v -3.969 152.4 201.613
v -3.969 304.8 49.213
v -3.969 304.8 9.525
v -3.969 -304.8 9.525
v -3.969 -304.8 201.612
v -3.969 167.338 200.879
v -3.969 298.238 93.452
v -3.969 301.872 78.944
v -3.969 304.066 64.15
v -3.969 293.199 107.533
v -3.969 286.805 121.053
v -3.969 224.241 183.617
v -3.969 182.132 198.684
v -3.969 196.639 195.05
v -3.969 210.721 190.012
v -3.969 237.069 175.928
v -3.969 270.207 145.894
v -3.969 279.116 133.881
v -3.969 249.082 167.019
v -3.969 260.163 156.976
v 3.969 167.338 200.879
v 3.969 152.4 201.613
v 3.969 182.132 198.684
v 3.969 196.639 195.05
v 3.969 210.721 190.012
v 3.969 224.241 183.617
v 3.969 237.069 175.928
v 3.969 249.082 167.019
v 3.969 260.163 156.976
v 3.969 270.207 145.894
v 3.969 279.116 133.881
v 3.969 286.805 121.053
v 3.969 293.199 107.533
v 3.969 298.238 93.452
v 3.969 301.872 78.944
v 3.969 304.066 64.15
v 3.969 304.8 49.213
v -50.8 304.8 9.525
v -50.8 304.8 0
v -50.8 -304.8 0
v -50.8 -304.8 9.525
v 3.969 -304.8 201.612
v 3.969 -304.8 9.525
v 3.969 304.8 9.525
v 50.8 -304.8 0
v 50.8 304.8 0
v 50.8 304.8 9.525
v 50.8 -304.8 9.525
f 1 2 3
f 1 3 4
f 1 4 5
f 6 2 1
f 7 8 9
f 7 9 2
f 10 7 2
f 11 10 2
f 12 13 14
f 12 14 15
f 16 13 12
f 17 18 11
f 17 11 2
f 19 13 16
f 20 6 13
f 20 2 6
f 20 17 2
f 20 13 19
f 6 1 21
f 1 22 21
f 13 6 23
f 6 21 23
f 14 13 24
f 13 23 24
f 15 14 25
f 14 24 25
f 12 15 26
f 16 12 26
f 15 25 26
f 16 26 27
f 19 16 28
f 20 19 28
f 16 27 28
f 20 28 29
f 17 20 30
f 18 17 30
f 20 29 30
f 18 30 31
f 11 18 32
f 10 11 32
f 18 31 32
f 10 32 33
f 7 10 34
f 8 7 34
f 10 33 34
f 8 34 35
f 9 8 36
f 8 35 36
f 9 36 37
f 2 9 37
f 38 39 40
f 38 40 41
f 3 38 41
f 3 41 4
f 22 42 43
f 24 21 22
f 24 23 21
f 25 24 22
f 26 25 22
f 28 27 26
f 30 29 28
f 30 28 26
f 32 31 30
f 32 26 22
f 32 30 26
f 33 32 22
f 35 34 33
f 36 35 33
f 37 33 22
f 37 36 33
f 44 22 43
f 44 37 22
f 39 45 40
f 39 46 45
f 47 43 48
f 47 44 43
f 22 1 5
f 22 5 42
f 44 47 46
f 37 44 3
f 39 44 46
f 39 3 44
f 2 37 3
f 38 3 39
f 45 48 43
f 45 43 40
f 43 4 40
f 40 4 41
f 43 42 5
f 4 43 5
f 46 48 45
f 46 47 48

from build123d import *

# Parameters (mm, degrees)
BOSS_EXTRUDE1_DEPTH = 304.8
FILLET1_R           = 152.4


with BuildPart() as part:
    # Sketch1 → Boss-Extrude1 (new body, symmetric)
    with BuildSketch(Plane(origin=(0, 0, 0), x_dir=(-1, 0, 0), z_dir=(0, 1, 0))):
        Polygon((-50.8, 0), (50.8, 0), (50.8, 9.525), (3.96875, 9.525), (3.96875, 201.6125), (-3.96875, 201.6125), (-3.96875, 9.525), (-50.8, 9.525), align=None)
    extrude(amount=BOSS_EXTRUDE1_DEPTH, both=True)

    # Fillet1
    fillet1_edges = [part.edges().sort_by_distance(p)[0] for p in [
        (0, 304.8, 201.6125),
    ]]
    fillet(fillet1_edges, radius=FILLET1_R)


solid = part.part
